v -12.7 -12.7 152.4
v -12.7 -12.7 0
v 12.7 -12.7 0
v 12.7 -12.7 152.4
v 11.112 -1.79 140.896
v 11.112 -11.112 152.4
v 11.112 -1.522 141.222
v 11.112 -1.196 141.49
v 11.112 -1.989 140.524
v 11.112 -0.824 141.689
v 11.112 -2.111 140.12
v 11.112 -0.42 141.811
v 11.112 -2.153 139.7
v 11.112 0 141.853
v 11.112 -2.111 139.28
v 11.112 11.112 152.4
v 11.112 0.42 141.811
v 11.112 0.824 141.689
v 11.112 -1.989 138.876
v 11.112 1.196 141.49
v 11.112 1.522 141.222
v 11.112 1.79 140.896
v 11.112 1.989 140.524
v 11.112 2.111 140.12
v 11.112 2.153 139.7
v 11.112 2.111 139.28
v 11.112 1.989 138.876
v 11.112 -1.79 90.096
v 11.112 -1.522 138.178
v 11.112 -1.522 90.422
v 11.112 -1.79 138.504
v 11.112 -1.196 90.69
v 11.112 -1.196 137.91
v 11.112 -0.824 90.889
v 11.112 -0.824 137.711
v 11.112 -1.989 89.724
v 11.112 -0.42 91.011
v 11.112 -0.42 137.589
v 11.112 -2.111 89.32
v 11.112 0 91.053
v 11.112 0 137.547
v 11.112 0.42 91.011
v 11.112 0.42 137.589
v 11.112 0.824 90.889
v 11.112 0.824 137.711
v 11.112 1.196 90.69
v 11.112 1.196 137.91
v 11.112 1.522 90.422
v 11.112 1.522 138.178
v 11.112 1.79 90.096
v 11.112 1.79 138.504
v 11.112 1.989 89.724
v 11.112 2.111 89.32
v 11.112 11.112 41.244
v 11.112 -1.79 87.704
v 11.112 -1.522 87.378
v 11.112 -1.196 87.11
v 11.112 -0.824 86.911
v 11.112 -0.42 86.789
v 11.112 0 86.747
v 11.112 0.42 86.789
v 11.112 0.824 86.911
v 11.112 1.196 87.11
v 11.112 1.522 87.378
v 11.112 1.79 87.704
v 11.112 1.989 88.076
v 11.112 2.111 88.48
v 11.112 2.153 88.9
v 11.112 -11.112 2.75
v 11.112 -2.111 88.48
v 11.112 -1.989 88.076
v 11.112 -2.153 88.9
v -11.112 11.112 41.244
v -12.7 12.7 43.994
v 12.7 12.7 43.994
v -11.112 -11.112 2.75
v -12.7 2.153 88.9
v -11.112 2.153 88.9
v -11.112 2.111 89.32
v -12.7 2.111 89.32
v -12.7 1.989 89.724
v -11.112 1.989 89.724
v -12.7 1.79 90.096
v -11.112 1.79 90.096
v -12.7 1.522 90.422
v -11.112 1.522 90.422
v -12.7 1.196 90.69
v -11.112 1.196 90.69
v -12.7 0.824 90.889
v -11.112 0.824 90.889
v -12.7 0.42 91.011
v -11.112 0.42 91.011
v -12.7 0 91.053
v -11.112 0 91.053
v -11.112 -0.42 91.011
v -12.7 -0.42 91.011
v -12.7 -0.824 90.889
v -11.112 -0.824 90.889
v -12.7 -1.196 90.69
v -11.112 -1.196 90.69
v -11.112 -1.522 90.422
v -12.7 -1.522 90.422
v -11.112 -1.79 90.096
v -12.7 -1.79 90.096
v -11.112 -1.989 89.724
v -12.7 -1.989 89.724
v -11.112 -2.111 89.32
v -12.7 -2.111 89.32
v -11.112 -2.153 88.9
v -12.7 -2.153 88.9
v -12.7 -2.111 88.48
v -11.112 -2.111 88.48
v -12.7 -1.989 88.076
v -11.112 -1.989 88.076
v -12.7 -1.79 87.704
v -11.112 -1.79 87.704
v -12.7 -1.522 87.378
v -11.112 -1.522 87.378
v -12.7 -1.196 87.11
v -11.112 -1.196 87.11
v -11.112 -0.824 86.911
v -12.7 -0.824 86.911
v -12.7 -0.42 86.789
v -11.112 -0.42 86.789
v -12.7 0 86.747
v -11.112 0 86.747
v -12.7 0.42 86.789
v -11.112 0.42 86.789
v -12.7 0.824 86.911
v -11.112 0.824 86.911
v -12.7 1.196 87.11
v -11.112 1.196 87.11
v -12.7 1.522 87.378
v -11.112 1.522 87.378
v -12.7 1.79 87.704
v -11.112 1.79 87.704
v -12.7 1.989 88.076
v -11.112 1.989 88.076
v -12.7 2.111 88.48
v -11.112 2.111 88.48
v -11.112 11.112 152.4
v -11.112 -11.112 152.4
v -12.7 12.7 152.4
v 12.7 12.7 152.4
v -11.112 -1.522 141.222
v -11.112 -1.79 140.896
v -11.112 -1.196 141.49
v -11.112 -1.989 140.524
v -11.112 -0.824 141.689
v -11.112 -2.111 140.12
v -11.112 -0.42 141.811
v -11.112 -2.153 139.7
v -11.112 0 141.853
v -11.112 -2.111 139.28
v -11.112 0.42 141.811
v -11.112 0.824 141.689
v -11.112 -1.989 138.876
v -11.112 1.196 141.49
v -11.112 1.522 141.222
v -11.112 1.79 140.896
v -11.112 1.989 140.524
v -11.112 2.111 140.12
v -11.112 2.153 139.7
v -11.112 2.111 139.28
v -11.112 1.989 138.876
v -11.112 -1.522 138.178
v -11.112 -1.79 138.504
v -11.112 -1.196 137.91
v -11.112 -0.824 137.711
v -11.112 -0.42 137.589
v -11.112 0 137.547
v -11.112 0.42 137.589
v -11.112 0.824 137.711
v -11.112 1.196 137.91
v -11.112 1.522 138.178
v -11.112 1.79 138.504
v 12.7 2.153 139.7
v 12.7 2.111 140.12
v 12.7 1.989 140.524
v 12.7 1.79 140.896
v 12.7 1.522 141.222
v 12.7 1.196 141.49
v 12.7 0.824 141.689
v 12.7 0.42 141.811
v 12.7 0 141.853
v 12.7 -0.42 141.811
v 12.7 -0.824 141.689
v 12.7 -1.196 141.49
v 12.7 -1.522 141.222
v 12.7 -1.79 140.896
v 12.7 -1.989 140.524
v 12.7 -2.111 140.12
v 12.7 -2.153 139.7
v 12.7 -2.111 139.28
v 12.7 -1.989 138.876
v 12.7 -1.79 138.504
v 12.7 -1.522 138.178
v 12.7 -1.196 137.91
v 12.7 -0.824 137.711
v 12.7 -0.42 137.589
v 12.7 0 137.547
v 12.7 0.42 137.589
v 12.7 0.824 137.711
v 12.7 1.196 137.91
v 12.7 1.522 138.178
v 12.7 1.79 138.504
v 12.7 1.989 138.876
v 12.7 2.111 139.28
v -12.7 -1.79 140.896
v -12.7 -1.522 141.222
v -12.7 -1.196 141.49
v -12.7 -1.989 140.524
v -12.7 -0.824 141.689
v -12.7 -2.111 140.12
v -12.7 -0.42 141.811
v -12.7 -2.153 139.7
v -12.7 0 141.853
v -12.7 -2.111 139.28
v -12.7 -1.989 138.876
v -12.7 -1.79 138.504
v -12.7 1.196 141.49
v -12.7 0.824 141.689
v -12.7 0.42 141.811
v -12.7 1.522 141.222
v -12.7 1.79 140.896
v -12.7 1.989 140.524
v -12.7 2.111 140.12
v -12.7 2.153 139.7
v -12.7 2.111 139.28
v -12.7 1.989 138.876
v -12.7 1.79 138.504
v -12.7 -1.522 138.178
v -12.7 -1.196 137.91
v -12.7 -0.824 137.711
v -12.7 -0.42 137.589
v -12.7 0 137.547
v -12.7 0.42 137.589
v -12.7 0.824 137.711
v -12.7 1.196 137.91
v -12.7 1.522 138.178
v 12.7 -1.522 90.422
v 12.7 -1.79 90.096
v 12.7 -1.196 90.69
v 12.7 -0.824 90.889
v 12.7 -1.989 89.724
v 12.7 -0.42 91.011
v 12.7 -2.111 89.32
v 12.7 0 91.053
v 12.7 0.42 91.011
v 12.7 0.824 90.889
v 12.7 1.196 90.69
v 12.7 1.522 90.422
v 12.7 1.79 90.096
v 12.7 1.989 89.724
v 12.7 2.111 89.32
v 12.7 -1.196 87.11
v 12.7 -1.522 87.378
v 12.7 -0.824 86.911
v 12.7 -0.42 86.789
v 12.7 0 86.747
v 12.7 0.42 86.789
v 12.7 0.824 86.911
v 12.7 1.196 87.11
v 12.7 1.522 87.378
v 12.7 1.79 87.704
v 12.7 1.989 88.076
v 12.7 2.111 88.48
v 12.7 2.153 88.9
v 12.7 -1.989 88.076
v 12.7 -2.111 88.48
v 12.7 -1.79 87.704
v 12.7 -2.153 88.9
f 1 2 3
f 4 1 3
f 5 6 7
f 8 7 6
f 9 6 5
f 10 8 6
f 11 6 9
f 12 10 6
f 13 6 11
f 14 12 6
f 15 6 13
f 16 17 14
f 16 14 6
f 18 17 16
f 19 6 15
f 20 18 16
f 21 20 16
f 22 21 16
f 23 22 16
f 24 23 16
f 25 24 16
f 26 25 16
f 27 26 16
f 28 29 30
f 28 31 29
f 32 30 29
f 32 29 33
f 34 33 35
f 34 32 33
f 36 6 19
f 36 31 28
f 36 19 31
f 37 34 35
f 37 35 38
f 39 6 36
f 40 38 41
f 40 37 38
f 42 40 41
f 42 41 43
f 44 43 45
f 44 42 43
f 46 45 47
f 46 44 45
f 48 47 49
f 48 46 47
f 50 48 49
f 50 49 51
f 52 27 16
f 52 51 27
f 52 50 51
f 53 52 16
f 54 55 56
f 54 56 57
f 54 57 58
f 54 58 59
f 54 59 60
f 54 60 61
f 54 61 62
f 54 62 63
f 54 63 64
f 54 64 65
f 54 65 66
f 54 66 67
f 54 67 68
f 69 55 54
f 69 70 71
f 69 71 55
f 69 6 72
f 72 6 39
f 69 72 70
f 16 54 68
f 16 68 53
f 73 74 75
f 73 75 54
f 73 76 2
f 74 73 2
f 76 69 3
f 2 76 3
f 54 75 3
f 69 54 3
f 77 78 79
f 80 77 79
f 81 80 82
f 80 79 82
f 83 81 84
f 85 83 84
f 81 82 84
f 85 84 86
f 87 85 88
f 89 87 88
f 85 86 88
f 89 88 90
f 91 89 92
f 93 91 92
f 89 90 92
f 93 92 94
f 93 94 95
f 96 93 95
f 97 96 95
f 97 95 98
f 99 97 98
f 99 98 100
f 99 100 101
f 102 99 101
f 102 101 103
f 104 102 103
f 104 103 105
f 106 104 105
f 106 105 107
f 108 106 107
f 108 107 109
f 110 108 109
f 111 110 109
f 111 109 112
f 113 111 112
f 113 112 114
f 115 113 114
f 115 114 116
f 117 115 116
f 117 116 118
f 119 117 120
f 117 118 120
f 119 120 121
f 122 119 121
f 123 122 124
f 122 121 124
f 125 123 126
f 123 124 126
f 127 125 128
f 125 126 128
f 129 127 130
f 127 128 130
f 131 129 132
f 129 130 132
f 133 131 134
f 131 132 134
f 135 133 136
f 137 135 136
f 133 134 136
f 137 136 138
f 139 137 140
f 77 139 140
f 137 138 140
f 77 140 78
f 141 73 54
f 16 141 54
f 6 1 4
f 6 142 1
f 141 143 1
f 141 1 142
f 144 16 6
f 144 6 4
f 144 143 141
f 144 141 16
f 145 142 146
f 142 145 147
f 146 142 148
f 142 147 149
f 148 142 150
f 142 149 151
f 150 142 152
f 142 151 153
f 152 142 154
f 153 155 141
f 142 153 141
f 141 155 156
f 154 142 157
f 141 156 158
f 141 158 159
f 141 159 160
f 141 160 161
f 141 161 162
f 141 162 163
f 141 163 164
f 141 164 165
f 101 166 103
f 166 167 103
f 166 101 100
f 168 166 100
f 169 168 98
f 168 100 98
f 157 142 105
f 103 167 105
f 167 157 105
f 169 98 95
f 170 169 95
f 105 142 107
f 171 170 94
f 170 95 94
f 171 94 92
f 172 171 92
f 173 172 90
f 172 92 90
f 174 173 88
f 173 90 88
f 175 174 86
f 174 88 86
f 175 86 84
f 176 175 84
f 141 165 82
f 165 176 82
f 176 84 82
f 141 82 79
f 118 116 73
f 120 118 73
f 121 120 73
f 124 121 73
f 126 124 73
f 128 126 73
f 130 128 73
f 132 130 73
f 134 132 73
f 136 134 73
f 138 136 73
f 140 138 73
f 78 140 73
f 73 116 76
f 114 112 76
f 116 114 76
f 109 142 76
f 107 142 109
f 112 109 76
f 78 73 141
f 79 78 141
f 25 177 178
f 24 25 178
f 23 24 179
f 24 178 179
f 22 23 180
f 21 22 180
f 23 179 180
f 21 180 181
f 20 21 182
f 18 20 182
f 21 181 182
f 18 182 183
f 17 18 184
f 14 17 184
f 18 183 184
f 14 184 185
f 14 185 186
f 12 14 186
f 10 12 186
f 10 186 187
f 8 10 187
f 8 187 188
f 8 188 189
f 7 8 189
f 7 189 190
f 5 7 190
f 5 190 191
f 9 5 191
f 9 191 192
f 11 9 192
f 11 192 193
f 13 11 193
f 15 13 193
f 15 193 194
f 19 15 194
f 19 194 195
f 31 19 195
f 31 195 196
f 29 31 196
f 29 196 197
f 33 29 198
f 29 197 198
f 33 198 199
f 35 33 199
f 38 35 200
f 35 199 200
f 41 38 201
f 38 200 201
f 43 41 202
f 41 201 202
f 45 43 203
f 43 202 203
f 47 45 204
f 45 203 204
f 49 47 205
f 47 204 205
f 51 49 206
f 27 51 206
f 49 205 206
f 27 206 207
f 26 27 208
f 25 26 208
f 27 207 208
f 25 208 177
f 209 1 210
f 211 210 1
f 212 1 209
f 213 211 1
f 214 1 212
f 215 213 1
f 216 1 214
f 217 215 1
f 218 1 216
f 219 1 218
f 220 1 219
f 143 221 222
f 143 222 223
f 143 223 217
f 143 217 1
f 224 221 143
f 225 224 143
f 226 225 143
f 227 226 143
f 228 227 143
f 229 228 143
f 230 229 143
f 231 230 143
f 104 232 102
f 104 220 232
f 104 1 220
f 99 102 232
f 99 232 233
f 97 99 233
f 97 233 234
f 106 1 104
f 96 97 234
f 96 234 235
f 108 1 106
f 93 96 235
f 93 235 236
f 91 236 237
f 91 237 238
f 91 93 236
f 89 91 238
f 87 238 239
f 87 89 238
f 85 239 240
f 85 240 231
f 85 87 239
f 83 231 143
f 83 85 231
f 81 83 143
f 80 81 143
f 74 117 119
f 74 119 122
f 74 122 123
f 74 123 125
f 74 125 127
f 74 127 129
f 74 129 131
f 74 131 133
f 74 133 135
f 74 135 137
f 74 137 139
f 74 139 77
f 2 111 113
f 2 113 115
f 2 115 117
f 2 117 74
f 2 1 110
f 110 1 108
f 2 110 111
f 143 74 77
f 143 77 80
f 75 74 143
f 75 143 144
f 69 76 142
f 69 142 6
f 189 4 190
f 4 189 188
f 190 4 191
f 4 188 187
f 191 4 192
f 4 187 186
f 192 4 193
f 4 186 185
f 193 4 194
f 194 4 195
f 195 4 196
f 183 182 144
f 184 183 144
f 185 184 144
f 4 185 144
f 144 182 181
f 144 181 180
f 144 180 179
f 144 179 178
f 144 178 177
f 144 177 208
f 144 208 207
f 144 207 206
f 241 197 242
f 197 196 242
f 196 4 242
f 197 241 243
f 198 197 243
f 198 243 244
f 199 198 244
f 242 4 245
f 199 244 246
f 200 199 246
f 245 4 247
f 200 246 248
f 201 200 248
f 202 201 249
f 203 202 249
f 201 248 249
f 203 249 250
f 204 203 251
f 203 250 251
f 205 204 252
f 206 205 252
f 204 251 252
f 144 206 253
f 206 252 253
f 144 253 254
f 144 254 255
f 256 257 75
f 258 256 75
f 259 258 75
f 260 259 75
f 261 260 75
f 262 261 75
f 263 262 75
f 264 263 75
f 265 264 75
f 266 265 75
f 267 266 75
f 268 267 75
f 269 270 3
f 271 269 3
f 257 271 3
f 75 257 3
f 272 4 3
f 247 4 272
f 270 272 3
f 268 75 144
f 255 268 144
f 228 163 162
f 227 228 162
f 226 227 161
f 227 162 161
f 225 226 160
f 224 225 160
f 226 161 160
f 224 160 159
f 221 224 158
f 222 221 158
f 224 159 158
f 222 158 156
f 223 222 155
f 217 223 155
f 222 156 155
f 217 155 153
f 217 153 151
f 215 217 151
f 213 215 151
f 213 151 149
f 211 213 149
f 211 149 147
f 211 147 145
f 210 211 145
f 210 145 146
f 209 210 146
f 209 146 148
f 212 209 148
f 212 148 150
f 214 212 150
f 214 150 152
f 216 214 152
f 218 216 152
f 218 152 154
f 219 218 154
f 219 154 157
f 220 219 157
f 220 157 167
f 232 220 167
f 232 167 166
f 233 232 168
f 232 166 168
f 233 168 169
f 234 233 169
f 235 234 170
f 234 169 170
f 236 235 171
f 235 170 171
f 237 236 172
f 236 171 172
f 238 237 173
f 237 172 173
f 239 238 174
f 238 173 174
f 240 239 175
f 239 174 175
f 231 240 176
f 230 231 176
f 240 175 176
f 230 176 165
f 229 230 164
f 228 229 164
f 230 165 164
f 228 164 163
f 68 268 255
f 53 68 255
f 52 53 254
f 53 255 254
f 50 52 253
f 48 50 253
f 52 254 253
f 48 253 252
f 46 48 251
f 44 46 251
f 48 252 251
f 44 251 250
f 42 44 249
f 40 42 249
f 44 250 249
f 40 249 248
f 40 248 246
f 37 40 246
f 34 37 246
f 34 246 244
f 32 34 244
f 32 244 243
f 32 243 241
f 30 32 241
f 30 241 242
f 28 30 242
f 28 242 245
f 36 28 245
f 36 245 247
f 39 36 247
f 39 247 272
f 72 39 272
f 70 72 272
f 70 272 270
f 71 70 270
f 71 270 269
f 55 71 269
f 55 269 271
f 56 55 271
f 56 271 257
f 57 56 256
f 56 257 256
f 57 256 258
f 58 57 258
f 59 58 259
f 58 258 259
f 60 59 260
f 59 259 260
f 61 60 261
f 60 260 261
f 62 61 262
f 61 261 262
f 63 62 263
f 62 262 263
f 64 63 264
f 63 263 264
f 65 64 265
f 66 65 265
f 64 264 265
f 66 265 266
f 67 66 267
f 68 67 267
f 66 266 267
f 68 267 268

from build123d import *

# Parameters (mm, degrees)
F0_W     = 25.4
F0_H     = 25.4
F0_W_2   = 22.225
F0_H_2   = 22.225
F1_DEPTH = 152.4
F3_DEPTH = 25.4
F4_R     = 2.15265
F5_DEPTH = 25.4


with BuildPart() as f1:
    # F0 (on Top) → F1 (new body)
    with BuildSketch(Plane.XY):
        Rectangle(F0_W, F0_H)
        Rectangle(F0_W_2, F0_H_2, mode=Mode.SUBTRACT)
    extrude(amount=F1_DEPTH)

    # F2 (on face) → F3 (cut, through all)
    with BuildSketch(Plane.YZ.offset(12.7)):
        Polygon((12.7, 43.994091), (-12.7, 0), (12.7, 0), align=None)
    extrude(amount=-F3_DEPTH, mode=Mode.SUBTRACT)

    # F4 (on face) → F5 (cut, through all)
    with BuildSketch(Plane.YZ.offset(12.7)):
        with Locations((0, 139.7)):
            Circle(F4_R)
        with Locations((0, 88.9)):
            Circle(F4_R)
    extrude(amount=-F5_DEPTH, mode=Mode.SUBTRACT)


solid = f1.part
